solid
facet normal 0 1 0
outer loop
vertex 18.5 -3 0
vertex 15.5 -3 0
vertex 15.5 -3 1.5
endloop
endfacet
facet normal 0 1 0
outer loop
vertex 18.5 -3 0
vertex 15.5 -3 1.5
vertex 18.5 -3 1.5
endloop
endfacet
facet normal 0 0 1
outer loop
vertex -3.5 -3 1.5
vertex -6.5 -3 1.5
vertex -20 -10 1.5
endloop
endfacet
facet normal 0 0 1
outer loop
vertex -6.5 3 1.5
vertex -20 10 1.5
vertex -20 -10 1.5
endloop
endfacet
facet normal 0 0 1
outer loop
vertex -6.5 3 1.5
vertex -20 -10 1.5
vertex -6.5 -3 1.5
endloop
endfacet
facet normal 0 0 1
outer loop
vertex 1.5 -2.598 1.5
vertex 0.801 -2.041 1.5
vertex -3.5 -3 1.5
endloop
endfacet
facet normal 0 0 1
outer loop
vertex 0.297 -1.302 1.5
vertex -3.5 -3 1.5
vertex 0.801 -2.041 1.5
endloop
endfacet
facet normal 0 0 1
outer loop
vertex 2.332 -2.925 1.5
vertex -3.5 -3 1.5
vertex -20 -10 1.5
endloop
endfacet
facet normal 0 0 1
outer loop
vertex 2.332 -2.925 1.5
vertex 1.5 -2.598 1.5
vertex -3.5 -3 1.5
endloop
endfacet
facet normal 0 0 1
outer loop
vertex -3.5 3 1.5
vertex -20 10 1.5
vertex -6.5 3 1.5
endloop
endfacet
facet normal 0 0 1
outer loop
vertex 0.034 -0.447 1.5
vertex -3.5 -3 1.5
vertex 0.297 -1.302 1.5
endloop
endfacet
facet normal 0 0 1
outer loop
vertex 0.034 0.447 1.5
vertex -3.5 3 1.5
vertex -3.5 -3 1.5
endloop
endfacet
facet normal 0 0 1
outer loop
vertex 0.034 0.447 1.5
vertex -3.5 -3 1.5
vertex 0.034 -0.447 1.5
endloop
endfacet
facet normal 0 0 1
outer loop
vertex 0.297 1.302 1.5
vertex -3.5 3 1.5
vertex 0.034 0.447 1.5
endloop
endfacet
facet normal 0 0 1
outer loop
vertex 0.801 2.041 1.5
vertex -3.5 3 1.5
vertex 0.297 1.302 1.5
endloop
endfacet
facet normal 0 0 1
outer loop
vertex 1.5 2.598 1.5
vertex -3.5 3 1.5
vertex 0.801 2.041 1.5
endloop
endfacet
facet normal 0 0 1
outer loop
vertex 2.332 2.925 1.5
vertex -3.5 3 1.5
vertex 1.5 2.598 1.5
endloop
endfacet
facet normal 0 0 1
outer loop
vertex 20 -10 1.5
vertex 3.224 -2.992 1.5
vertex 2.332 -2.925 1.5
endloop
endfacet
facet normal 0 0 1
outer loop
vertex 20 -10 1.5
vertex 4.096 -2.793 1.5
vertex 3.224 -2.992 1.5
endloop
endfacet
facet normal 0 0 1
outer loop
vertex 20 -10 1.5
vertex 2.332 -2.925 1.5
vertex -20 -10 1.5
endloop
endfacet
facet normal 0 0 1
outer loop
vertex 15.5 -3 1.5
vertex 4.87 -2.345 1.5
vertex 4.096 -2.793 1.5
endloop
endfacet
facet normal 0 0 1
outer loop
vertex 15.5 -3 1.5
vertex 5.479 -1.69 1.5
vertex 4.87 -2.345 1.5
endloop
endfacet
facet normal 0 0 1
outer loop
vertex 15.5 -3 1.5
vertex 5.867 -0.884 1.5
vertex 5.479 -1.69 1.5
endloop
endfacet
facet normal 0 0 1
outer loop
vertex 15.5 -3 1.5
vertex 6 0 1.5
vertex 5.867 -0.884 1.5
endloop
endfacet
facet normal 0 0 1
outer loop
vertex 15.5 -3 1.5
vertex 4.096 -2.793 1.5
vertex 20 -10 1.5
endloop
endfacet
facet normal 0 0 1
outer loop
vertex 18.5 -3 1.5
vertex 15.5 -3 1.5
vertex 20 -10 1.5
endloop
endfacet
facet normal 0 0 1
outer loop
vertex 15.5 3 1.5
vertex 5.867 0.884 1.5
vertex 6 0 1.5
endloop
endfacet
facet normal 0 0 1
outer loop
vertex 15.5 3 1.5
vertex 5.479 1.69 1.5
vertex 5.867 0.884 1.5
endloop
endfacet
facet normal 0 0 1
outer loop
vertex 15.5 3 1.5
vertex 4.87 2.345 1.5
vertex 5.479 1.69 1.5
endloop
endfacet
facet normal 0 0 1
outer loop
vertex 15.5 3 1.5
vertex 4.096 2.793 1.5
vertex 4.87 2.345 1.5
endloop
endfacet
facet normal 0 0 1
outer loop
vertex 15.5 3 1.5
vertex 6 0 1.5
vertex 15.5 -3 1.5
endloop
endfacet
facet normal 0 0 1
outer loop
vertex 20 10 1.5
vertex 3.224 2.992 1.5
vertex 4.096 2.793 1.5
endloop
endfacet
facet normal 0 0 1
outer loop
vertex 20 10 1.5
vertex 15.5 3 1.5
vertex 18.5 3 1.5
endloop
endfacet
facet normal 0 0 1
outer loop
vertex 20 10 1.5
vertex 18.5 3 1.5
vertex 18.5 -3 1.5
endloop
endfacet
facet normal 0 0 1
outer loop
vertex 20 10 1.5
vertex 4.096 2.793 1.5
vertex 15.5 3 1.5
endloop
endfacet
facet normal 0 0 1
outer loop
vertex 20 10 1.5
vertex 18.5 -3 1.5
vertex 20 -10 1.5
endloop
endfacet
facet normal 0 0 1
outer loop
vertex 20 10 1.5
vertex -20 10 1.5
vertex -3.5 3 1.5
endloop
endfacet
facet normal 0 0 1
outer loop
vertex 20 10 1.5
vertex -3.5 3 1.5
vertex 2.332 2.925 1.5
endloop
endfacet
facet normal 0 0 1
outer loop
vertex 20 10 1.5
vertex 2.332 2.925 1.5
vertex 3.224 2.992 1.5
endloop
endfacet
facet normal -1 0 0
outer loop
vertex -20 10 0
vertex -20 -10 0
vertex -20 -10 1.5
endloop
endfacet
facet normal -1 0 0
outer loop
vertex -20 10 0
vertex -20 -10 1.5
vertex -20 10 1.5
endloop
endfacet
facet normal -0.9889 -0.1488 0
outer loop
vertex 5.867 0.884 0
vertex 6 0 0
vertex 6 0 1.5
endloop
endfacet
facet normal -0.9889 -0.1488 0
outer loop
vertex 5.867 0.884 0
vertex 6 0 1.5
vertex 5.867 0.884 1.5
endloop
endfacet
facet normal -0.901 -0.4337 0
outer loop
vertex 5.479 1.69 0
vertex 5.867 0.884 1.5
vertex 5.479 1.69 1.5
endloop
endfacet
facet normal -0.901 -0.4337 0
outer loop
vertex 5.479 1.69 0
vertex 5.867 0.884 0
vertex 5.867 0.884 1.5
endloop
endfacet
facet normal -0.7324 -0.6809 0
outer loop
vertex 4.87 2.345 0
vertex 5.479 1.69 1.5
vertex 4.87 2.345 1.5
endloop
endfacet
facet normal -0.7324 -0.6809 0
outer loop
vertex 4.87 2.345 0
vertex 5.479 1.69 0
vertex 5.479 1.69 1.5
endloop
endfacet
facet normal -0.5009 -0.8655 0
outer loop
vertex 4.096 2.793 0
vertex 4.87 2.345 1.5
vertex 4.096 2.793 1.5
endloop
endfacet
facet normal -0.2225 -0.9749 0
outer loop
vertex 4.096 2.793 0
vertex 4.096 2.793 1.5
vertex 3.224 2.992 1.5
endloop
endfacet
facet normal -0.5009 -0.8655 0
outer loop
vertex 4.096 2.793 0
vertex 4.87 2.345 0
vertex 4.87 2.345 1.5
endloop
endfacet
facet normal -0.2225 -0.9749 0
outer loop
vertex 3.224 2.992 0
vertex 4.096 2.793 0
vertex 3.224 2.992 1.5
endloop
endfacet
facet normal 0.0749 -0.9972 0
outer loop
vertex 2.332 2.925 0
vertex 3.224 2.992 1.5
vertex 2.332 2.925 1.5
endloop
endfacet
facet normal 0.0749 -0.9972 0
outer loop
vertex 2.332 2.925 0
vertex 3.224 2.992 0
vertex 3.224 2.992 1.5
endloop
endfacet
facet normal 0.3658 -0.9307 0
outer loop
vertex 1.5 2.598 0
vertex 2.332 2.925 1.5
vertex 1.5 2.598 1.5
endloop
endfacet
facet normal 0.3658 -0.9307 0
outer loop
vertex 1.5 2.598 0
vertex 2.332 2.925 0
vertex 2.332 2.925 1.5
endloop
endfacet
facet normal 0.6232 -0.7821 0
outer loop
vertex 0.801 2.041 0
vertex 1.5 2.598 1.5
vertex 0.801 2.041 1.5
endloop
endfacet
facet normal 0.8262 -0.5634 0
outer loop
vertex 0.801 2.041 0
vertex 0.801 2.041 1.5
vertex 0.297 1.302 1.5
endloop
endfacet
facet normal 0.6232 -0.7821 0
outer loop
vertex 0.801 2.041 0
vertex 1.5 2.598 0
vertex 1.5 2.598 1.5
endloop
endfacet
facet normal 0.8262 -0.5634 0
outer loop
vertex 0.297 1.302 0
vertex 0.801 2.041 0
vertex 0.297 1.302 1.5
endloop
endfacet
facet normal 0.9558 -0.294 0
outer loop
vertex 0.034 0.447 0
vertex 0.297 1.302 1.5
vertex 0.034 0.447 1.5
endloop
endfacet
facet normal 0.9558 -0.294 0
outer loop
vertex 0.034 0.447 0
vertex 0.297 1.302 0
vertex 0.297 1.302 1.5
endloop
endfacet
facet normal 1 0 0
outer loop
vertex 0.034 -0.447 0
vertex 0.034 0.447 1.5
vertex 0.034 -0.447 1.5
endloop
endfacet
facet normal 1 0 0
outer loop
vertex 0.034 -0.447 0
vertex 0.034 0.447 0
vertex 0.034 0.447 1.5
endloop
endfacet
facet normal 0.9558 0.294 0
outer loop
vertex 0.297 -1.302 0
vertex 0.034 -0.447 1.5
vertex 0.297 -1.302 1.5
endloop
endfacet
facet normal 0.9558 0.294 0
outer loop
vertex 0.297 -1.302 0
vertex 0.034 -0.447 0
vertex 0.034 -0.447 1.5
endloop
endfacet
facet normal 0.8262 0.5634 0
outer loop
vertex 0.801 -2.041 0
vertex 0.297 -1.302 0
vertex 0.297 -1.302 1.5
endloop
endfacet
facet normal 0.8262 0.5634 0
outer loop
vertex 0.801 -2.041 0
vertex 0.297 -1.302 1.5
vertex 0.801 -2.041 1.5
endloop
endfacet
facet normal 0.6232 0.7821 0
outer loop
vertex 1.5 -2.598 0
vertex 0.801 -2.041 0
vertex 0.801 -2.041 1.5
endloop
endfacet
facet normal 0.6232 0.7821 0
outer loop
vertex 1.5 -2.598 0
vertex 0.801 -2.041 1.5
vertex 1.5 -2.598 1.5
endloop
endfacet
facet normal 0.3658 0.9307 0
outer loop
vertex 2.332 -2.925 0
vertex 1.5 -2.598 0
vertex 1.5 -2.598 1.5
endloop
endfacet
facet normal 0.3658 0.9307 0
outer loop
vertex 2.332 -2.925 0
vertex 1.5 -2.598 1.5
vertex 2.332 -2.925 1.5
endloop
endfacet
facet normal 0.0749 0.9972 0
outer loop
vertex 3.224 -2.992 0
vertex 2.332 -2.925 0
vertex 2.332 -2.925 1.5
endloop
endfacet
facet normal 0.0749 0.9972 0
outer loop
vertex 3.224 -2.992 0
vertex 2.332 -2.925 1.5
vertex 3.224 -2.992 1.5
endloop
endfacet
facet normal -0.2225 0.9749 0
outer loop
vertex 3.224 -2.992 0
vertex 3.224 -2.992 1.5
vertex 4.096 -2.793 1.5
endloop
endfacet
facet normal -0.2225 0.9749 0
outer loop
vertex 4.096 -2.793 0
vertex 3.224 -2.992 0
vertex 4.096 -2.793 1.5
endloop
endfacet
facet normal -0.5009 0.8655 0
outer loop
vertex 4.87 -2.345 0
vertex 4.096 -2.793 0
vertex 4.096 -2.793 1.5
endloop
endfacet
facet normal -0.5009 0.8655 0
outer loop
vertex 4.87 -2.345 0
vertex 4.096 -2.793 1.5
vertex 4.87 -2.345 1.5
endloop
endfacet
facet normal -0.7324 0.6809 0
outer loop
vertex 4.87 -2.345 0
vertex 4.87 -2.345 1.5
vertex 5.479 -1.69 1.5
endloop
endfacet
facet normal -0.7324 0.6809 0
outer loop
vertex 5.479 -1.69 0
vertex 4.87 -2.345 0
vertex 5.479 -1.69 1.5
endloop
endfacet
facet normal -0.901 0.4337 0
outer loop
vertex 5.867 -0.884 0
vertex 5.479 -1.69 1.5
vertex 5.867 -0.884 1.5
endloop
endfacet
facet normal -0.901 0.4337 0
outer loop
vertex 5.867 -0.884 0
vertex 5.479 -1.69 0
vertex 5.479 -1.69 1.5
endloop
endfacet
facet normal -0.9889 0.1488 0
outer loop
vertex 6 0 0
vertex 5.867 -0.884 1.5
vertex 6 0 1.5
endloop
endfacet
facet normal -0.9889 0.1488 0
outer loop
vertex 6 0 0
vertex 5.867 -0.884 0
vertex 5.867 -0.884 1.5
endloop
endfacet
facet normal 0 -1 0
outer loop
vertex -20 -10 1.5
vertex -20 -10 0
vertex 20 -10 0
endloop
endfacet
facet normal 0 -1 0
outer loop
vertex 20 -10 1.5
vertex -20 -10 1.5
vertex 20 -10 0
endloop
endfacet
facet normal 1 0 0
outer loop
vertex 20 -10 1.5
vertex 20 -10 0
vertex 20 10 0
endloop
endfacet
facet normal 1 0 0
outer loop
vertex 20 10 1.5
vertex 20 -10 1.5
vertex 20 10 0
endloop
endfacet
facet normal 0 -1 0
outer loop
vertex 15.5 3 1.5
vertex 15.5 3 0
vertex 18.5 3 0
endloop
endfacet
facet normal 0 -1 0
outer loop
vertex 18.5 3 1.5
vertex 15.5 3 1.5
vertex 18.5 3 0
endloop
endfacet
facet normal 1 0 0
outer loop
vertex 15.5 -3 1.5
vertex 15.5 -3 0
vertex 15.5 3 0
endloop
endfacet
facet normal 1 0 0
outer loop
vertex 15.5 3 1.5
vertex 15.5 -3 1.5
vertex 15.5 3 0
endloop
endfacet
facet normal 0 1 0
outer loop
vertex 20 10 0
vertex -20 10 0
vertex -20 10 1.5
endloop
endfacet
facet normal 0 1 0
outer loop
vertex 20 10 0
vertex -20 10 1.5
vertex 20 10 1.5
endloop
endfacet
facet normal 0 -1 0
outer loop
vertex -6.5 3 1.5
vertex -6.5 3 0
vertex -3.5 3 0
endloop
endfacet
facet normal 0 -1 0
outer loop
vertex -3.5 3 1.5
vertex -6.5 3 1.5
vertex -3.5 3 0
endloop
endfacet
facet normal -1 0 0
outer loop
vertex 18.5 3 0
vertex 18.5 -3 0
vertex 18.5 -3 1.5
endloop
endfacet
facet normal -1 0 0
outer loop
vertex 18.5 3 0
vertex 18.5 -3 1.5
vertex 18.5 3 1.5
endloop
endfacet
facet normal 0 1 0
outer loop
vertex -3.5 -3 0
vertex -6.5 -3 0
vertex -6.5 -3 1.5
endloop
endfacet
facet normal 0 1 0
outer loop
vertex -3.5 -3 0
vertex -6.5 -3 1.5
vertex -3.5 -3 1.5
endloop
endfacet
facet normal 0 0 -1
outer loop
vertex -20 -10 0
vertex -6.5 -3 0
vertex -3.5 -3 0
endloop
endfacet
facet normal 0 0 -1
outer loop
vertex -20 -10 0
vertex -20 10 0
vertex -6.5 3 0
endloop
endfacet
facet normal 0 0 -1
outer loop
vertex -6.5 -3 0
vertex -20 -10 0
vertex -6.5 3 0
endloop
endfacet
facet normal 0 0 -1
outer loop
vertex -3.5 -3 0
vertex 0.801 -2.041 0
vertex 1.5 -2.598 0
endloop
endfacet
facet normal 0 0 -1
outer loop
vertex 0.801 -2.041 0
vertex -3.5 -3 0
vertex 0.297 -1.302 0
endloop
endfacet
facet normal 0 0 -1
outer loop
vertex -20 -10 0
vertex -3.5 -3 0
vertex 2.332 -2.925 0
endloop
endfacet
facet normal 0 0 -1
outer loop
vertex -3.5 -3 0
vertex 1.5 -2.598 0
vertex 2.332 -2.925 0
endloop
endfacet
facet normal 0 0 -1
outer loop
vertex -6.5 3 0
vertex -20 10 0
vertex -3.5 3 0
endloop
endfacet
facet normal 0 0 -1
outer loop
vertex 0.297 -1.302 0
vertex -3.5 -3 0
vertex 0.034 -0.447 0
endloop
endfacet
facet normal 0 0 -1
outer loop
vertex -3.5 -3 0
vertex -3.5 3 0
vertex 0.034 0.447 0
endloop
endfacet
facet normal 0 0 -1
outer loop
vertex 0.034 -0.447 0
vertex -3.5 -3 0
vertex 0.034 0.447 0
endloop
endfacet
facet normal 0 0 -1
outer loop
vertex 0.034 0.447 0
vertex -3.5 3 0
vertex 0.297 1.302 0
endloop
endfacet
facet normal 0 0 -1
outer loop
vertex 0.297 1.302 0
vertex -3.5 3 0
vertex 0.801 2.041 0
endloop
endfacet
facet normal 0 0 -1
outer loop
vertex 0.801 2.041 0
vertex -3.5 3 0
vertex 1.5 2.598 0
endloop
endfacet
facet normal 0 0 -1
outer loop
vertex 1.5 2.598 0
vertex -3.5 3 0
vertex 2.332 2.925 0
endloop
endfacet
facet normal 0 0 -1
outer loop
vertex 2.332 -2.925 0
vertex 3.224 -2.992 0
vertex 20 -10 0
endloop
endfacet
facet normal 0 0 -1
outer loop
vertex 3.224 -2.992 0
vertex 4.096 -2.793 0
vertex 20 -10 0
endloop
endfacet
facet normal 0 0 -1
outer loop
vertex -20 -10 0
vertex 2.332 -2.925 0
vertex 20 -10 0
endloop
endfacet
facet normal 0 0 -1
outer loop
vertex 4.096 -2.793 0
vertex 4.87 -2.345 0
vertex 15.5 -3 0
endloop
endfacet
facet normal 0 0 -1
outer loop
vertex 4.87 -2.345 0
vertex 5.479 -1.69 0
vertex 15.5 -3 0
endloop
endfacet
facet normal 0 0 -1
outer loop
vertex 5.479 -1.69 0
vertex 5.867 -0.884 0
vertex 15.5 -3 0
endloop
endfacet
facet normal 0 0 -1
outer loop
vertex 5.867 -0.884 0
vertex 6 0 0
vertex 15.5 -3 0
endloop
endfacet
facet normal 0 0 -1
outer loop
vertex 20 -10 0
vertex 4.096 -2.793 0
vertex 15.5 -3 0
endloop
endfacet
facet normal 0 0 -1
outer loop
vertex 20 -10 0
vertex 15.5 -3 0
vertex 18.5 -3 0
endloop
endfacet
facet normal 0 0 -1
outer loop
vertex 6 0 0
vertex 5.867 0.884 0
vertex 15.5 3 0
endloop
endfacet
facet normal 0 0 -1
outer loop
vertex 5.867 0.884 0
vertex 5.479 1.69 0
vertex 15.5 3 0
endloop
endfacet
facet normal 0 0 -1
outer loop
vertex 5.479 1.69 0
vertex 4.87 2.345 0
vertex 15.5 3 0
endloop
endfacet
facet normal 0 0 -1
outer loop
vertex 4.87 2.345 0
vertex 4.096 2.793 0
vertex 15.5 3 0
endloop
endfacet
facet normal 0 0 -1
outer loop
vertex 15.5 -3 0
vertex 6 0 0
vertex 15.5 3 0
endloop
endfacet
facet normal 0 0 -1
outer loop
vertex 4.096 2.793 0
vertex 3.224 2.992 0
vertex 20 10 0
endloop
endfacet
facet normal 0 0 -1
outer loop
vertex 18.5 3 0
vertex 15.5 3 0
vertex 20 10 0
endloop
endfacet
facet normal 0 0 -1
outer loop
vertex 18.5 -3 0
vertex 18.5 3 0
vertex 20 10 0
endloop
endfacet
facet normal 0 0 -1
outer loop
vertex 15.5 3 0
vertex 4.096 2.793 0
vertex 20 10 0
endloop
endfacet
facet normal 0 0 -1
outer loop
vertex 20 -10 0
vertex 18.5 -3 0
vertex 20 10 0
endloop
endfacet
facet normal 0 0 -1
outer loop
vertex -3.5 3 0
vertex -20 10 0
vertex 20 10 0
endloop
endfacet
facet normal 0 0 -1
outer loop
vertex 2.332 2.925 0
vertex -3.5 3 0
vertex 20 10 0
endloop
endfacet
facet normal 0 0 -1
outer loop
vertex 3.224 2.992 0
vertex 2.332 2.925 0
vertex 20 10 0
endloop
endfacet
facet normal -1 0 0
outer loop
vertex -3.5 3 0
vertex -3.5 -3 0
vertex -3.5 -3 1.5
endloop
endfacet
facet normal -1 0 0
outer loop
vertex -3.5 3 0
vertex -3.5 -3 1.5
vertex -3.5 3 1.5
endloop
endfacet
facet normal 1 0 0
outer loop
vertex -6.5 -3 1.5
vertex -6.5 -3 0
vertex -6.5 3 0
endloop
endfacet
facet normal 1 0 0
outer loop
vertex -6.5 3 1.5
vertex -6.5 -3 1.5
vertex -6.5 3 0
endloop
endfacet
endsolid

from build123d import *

# Parameters (mm, degrees)
SKETCH_1_W      = 40
SKETCH_1_H      = 20
SKETCH_1_R      = 3
SKETCH_1_W_2    = 3
SKETCH_1_H_2    = 6
EXTRUDE_1_DEPTH = 1.5


with BuildPart() as part:
    # 草图1 → 凸台-拉伸1 (new body)
    with BuildSketch(Plane.XY):
        Rectangle(SKETCH_1_W, SKETCH_1_H)
        with Locations((3, 0)):
            Circle(SKETCH_1_R, mode=Mode.SUBTRACT)
        with Locations((-5, 0)):
            Rectangle(SKETCH_1_W_2, SKETCH_1_H_2, mode=Mode.SUBTRACT)
        with Locations((17, 0)):
            Rectangle(SKETCH_1_W_2, SKETCH_1_H_2, mode=Mode.SUBTRACT)
    extrude(amount=EXTRUDE_1_DEPTH)


solid = part.part
